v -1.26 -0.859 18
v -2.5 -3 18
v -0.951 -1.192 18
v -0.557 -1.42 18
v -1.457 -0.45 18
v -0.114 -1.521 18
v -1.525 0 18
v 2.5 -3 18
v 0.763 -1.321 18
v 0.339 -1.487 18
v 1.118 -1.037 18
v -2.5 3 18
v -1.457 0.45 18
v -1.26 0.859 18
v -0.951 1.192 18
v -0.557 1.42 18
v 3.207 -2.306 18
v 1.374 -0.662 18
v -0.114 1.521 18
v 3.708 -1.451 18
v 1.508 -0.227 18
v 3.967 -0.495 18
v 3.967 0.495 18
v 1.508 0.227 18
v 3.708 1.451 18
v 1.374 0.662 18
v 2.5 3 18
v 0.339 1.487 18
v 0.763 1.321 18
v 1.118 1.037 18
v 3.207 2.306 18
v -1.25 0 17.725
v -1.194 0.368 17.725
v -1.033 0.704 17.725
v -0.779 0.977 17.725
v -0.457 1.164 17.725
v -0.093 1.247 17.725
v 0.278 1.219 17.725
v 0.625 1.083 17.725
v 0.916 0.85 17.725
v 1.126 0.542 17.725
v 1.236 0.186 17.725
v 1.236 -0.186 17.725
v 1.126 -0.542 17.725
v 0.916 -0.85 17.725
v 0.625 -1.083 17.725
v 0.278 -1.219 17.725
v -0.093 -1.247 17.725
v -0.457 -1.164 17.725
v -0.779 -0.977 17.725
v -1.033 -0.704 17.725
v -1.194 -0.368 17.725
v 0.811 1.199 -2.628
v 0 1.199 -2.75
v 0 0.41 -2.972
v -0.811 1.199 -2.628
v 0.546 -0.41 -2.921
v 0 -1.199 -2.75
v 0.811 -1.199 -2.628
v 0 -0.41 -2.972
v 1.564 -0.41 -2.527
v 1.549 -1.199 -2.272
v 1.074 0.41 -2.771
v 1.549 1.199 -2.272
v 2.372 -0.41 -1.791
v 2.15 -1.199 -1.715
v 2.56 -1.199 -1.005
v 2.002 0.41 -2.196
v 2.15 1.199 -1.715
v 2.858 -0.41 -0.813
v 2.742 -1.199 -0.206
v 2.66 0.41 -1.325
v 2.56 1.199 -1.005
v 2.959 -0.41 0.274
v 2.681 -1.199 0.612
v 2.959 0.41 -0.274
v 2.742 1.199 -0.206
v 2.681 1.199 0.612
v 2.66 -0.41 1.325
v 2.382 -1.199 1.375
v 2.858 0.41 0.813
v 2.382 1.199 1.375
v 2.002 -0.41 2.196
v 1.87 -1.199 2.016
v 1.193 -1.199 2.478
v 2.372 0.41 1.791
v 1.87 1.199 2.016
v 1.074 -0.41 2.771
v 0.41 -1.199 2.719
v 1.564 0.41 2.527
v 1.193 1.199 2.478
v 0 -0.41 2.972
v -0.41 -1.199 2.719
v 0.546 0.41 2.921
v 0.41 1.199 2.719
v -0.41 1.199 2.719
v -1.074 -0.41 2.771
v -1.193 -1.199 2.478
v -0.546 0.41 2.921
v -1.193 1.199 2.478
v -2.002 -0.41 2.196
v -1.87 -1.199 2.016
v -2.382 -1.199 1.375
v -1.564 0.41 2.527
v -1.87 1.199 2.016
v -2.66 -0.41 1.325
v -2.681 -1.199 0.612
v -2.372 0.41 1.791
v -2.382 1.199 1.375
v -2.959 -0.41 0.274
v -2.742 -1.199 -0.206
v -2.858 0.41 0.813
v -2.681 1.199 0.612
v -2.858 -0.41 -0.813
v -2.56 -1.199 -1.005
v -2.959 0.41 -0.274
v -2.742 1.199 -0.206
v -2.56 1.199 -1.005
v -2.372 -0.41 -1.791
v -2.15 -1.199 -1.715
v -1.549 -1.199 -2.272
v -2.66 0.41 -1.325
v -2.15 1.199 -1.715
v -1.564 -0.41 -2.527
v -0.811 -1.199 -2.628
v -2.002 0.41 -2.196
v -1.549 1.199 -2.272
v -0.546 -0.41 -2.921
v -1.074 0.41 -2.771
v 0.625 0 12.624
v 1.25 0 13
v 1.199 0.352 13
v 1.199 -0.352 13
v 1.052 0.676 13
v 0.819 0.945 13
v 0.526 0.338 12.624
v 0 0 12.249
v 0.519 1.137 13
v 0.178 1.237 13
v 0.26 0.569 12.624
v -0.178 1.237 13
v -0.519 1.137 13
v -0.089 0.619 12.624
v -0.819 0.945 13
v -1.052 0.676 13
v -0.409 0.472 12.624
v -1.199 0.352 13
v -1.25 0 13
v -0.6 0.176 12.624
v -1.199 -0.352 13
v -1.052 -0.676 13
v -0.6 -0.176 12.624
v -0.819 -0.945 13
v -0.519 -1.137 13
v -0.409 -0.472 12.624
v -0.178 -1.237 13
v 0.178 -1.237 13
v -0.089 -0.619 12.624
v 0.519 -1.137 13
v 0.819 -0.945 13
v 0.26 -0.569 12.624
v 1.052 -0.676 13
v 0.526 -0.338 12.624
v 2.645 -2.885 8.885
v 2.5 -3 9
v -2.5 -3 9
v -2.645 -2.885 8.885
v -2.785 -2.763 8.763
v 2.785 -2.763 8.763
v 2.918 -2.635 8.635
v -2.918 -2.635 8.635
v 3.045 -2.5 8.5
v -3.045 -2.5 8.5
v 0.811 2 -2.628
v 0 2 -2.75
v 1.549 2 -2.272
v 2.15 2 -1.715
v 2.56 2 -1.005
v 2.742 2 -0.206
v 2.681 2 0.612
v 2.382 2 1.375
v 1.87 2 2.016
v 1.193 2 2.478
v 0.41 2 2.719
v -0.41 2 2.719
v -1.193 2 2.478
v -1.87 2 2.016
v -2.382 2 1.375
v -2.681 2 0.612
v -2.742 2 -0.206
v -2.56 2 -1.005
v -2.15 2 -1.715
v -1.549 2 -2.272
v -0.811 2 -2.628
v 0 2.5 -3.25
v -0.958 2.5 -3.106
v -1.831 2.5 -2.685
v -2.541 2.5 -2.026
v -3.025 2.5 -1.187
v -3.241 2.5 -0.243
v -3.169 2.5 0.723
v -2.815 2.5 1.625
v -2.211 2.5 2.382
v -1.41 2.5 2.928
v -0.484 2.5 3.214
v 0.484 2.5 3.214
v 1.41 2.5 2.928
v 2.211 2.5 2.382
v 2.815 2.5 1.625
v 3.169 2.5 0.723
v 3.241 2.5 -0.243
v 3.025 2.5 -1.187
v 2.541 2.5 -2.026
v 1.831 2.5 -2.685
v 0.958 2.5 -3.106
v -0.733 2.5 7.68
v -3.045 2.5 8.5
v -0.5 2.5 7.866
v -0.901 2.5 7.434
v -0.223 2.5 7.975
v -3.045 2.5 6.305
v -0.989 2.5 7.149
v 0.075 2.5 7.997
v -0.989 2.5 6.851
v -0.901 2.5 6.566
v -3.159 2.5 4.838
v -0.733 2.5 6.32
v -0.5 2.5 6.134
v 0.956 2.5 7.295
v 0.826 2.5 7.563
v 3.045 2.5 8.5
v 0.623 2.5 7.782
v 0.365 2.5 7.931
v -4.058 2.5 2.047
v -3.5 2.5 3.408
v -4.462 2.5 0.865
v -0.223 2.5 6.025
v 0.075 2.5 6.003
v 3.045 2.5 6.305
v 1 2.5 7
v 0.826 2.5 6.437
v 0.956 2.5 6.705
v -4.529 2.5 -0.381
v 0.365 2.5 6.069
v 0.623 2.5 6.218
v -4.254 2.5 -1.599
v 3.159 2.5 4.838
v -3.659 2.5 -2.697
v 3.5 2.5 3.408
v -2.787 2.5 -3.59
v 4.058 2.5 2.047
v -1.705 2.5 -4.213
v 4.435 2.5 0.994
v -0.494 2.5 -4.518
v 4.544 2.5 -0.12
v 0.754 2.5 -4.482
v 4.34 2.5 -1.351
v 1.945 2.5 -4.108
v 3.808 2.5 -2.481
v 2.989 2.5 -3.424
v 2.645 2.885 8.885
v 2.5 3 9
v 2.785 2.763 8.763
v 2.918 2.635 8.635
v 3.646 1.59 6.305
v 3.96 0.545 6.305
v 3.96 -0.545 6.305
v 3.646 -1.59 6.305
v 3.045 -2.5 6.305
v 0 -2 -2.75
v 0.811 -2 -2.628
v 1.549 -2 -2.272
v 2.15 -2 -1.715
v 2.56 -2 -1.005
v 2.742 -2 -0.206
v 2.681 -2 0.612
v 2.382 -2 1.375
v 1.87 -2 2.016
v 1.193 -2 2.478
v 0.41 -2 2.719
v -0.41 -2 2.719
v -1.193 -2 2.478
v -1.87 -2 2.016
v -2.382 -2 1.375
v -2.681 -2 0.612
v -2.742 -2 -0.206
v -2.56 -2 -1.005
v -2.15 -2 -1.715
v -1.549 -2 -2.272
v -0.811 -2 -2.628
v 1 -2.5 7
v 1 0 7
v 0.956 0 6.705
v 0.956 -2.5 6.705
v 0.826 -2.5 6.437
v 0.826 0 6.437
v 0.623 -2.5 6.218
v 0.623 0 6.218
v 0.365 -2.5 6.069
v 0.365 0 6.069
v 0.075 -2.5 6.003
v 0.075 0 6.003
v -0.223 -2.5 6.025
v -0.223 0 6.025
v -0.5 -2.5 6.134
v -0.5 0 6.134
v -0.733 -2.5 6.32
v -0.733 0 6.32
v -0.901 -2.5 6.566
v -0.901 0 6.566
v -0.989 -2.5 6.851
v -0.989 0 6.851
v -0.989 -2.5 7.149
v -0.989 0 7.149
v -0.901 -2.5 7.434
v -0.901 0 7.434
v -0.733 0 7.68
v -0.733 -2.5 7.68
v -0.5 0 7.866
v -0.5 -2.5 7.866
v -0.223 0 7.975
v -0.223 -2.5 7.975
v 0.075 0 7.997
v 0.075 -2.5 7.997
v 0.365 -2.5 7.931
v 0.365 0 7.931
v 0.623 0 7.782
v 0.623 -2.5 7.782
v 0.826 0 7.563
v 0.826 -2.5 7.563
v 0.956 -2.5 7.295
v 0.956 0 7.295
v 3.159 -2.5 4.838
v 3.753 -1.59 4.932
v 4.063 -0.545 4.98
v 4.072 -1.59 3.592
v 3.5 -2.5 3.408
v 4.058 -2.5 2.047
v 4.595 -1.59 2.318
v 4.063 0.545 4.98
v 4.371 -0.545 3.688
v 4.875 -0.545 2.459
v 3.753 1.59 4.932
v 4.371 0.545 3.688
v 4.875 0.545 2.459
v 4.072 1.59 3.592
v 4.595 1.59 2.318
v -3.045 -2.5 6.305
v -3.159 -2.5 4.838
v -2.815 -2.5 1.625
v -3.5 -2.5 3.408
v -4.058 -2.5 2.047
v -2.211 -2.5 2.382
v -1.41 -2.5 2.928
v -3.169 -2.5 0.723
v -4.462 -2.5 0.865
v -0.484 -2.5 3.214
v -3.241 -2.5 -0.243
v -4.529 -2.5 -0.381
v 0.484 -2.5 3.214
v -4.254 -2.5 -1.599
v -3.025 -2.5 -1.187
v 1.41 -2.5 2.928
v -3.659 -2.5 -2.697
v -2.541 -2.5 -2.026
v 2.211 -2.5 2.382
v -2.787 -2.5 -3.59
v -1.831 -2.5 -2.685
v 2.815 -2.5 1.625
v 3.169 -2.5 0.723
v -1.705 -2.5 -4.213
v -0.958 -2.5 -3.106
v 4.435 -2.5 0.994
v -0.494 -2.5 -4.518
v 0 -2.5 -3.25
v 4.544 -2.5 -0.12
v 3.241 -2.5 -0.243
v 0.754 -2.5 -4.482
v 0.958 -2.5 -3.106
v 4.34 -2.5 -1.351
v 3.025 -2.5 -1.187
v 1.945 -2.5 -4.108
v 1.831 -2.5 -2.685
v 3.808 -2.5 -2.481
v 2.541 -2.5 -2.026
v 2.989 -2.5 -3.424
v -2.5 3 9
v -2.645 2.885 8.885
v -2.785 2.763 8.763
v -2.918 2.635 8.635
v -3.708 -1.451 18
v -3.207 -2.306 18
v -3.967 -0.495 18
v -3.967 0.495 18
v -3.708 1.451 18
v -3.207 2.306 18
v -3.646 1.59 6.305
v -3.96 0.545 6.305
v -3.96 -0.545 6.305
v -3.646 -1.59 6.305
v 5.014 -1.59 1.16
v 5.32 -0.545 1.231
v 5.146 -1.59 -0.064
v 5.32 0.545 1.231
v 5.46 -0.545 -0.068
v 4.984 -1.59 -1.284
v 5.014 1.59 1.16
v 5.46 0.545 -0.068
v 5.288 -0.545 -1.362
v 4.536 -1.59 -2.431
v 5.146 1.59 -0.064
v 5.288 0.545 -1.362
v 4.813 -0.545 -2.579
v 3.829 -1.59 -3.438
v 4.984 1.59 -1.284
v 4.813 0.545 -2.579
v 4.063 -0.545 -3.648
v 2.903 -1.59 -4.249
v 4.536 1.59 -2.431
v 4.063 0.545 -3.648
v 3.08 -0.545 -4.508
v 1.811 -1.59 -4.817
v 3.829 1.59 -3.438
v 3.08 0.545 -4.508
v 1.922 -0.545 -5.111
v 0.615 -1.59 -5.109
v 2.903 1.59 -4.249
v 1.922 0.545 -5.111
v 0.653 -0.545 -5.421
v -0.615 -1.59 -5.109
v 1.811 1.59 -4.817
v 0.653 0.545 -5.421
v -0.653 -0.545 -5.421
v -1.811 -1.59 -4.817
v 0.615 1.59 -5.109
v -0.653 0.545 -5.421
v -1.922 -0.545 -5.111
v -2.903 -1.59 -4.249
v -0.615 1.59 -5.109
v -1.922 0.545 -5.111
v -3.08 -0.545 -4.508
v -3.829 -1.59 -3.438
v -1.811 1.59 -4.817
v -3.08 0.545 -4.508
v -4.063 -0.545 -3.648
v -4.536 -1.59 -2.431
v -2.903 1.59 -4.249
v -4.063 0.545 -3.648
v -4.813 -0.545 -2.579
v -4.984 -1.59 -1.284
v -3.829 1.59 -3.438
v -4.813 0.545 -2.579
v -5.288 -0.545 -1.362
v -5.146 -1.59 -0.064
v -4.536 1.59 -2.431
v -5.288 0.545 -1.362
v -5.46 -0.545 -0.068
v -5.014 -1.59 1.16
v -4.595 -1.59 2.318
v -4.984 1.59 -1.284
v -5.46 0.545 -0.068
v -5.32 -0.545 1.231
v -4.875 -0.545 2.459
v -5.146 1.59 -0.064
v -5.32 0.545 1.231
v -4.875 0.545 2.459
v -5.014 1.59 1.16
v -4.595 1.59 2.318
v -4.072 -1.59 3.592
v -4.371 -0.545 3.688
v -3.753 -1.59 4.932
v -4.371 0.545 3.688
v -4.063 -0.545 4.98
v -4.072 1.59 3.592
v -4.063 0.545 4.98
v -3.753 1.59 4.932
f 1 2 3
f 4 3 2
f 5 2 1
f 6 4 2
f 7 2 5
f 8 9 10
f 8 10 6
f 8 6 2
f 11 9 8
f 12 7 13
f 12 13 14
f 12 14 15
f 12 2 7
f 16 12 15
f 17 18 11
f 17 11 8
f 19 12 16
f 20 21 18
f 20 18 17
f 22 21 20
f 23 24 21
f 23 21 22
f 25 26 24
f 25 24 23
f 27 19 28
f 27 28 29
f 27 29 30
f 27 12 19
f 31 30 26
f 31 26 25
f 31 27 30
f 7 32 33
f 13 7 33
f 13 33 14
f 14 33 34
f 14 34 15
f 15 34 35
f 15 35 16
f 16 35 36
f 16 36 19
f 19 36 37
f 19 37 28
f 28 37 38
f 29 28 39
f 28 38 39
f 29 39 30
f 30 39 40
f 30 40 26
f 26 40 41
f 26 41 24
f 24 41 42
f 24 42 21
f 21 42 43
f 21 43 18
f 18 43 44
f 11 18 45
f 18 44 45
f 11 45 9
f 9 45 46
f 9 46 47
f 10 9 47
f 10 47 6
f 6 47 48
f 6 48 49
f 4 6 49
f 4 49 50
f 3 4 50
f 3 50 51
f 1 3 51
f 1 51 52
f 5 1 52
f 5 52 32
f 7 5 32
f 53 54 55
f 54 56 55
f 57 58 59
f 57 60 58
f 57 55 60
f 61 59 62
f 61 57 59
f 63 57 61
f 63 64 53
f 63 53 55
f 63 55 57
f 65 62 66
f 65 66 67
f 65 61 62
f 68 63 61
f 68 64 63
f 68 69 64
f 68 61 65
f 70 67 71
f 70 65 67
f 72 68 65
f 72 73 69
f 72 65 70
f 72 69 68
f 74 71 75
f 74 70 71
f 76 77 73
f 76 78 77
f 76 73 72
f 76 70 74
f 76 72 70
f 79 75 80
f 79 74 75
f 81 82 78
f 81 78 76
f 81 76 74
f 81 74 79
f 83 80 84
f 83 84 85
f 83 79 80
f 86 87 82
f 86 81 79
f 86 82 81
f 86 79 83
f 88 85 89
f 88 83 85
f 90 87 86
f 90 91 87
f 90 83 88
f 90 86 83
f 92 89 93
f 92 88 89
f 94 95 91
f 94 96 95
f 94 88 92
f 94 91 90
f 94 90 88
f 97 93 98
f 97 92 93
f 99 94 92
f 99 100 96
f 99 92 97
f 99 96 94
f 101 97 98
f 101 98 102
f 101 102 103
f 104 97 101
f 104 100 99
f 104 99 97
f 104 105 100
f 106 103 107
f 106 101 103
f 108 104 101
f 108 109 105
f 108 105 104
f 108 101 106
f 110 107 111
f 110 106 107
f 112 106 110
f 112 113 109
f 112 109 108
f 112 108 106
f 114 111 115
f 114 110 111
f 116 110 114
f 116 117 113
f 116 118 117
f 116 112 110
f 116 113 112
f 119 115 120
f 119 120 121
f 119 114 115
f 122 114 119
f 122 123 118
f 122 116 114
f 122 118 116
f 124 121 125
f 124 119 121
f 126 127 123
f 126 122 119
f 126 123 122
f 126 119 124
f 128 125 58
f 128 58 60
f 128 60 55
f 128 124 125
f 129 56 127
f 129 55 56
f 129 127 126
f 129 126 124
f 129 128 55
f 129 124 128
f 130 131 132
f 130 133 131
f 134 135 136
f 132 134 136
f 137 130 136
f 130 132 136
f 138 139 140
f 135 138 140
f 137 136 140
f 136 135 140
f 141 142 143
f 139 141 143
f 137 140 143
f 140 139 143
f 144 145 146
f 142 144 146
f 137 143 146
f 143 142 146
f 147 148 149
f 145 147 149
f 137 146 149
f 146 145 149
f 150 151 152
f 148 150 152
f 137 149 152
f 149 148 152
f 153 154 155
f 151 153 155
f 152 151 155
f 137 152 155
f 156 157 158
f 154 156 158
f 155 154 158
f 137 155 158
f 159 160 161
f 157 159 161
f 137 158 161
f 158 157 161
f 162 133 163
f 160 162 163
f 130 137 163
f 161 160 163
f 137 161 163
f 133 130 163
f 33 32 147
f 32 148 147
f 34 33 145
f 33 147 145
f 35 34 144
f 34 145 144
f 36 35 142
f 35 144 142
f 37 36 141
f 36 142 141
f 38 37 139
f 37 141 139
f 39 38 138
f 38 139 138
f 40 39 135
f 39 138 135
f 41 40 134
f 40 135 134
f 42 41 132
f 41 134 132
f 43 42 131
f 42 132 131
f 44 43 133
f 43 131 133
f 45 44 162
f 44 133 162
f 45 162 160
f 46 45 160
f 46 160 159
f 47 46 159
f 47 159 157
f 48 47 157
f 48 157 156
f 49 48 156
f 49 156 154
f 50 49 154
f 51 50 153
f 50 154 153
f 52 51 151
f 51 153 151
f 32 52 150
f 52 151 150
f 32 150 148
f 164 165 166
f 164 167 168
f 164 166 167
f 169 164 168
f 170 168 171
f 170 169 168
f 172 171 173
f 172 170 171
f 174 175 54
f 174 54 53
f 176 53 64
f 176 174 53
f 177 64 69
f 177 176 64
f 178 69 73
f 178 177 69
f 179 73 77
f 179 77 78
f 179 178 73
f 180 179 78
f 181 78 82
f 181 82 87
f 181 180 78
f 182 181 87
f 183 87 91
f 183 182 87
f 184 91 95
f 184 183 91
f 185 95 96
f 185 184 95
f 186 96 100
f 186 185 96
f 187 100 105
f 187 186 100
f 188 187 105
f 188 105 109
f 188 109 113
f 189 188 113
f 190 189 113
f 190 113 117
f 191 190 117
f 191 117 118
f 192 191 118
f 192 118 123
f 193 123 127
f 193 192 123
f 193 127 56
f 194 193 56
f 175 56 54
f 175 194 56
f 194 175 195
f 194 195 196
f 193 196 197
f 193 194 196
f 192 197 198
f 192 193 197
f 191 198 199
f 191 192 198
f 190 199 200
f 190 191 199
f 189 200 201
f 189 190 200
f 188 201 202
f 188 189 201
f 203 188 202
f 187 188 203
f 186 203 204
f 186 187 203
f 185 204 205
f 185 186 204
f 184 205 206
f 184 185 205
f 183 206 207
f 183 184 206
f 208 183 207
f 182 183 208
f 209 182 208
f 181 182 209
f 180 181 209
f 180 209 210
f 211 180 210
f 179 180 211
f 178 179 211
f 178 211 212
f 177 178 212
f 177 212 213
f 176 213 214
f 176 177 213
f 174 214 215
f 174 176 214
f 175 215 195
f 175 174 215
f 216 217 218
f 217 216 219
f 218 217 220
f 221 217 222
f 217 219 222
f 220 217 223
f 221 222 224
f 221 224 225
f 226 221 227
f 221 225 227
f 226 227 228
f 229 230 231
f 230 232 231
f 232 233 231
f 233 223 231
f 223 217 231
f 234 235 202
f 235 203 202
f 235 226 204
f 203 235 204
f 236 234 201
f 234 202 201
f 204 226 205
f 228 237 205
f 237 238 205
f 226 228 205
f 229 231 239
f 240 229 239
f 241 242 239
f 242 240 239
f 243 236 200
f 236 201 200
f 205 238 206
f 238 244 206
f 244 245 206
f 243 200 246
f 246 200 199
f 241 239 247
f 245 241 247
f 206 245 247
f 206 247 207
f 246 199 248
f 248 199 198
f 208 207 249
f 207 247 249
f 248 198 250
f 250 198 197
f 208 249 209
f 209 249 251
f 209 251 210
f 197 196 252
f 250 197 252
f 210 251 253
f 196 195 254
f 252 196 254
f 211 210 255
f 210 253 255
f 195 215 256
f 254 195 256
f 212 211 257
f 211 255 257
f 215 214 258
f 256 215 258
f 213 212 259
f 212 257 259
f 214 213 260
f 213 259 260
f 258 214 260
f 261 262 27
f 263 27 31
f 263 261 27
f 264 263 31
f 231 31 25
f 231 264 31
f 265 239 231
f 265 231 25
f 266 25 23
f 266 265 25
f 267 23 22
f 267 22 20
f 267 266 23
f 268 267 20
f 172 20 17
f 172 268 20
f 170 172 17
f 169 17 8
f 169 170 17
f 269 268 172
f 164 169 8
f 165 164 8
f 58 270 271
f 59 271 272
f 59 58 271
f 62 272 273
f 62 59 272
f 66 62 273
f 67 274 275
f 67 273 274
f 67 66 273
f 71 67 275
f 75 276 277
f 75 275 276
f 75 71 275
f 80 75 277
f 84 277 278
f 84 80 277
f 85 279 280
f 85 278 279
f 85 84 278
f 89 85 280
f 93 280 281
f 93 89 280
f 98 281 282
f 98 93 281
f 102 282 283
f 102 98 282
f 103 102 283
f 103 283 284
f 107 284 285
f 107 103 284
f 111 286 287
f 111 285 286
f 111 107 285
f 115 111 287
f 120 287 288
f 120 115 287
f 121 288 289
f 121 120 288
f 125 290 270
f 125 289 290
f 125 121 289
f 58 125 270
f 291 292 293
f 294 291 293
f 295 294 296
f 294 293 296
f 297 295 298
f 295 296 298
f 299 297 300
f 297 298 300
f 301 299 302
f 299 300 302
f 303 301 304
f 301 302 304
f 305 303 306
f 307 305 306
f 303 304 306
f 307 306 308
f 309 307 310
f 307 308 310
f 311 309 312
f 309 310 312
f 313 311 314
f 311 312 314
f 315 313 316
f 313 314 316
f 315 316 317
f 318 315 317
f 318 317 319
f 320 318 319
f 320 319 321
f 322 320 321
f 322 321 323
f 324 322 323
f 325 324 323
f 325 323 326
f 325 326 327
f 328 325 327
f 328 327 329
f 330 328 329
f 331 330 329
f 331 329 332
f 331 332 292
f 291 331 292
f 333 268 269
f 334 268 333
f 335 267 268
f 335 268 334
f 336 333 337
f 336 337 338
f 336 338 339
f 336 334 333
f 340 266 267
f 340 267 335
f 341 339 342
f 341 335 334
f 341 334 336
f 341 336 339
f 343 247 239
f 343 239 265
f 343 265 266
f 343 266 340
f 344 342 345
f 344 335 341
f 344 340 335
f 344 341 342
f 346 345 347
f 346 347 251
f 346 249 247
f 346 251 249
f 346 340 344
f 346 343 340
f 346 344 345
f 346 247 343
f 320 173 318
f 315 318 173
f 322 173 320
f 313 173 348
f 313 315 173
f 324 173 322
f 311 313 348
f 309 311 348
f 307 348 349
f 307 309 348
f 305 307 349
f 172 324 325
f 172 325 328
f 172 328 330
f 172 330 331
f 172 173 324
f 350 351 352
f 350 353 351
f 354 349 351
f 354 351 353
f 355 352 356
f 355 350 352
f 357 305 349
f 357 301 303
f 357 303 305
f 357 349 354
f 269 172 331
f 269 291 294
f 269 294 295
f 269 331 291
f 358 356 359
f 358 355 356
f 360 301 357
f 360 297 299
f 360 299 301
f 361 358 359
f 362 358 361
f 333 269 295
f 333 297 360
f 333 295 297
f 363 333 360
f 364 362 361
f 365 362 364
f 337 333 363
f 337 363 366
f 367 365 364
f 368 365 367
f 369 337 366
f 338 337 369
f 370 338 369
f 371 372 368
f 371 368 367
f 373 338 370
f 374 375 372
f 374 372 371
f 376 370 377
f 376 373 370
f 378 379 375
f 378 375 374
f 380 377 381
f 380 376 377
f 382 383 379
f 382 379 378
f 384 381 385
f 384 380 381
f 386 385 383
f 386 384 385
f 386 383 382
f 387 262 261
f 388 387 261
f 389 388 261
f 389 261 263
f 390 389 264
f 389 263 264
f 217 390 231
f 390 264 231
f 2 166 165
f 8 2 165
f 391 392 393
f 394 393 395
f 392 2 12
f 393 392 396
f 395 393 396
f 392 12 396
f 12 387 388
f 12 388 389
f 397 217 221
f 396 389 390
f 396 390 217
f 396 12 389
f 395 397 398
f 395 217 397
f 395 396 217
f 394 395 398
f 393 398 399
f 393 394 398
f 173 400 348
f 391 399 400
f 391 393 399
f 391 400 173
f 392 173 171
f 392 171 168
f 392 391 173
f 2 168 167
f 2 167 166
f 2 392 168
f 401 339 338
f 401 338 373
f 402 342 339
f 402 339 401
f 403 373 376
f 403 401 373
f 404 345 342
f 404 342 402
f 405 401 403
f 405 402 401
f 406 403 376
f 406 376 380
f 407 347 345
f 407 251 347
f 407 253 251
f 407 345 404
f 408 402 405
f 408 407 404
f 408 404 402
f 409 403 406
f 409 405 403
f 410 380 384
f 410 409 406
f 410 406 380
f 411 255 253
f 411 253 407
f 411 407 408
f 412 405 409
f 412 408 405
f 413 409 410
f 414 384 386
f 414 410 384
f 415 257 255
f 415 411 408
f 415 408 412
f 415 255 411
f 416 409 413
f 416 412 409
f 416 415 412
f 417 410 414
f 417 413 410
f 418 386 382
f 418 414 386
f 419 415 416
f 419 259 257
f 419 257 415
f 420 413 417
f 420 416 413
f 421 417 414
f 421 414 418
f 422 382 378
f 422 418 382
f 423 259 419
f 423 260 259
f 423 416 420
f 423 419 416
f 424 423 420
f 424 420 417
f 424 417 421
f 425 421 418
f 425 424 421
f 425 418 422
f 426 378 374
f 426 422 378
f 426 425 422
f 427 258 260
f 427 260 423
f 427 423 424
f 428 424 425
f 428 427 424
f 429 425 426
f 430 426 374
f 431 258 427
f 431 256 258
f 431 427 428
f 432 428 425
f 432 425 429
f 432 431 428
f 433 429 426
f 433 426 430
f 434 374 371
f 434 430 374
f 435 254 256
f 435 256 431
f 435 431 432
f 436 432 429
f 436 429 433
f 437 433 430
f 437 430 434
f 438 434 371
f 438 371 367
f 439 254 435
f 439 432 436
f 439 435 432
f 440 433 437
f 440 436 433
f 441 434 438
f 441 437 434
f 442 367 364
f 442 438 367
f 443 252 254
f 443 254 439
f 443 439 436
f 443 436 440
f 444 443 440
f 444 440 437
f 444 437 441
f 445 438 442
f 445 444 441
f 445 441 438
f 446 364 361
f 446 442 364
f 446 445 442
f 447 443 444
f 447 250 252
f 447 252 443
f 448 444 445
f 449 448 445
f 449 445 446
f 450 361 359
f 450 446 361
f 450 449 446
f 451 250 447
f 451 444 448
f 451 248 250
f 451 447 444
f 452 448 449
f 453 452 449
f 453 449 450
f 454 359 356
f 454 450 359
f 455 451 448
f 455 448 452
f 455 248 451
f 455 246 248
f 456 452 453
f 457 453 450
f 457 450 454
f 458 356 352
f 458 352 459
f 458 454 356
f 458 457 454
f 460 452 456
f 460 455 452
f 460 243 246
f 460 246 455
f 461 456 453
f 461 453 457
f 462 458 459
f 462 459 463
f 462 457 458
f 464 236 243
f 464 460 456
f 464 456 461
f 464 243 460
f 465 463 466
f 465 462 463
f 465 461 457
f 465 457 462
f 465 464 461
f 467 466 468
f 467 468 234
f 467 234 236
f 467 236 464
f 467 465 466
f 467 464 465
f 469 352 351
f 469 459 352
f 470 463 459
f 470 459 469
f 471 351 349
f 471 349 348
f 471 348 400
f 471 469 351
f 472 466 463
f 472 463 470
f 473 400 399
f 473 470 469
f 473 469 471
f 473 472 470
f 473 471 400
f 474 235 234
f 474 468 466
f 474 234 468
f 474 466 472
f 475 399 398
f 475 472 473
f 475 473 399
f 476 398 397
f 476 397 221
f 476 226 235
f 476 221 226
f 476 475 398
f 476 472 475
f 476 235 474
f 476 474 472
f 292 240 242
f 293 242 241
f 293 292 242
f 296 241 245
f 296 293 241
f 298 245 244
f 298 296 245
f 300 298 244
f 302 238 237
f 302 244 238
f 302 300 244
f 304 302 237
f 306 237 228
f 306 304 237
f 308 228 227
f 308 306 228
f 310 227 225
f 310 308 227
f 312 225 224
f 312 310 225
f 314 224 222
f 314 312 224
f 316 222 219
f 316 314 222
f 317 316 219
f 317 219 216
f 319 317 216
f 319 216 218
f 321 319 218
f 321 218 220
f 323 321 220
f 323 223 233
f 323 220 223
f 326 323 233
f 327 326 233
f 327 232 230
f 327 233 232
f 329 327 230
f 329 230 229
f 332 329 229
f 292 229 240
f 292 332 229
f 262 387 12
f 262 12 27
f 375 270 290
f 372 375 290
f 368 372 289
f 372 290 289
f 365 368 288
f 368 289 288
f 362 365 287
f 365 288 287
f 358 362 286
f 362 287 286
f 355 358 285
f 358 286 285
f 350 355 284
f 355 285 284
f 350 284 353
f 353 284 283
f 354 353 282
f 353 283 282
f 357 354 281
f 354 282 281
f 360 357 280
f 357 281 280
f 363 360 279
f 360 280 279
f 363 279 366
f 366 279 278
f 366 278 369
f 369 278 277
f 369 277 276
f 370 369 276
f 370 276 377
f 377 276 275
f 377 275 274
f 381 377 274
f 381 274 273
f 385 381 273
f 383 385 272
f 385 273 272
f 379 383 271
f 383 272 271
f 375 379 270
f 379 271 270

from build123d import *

# Parameters (mm, degrees)
BOSS_EXTRUDE1_DEPTH         = 3
FILLET1_R                   = 10
M3_TAPPED_HOLE1_D           = 2.5
M3_TAPPED_HOLE1_DEPTH       = 5
M3_TAPPED_HOLE1_CSINK_D     = 3.05
M3_TAPPED_HOLE1_CSINK_ANGLE = 90
M3_TAPPED_HOLE1_TIP         = 0.751075774
CUT_EXTRUDE1_DEPTH          = 6.5000001
SKETCH8_R                   = 1
CUT_EXTRUDE2_DEPTH          = 4
CUT_EXTRUDE2_DEPTH_BACK     = 4
CHAMFER1_SIZE               = 0.5


with BuildPart() as part:
    # Sketch1 → Boss-Extrude1 (new body, symmetric)
    with BuildSketch(Plane(origin=(0, 0, 0), x_dir=(1, 0, 0), z_dir=(0, 1, 0))):
        with BuildLine():
            Line((-2.5, -3.122498999), (-2.5, -18))
            Line((-2.5, -18), (2.5, -18))
            Line((2.5, -18), (2.5, -3.122498999))
            ThreePointArc((2.5, -3.122498999), (0, 4), (-2.5, -3.122498999))
        make_face()
    extrude(amount=BOSS_EXTRUDE1_DEPTH, both=True)

    # Fillet1
    fillet1_edges = [part.edges().sort_by_distance(p)[0] for p in [
        (-2.5, 0, 3.122498999),
        (2.5, 0, 3.122498999),
    ]]
    fillet(fillet1_edges, radius=FILLET1_R)

    # Sweep1: sweep along a path in Sketch3
    with BuildLine(Plane(origin=(0, 3, 0), x_dir=(1, 0, 0), z_dir=(0, 1, 0))) as sweep1_path:
        Line((2.5, -18), (2.5, -6.304760106))
        ThreePointArc((2.5, -6.304760106), (2.771543949, -3.990209857), (3.571428571, -1.80136003))
        ThreePointArc((3.571428571, -1.80136003), (0, 4), (-3.571428571, -1.80136003))
        ThreePointArc((-3.571428571, -1.80136003), (-2.771543949, -3.990209857), (-2.5, -6.304760106))
        Line((-2.5, -6.304760106), (-2.5, -18))
    # Sketch2 → Sweep1 (sweep)
    with BuildSketch(Plane.XY.offset(18)):
        with BuildLine():
            Line((2.5, 3), (2.5, -3))
            ThreePointArc((2.5, -3), (4, 0), (2.5, 3))
        make_face()
    sweep(path=sweep1_path.line)

    # M3 Tapped Hole1
    with Locations(Plane.XY.offset(18)):
        with Locations((0, 0)):
            CounterSinkHole(M3_TAPPED_HOLE1_D / 2, M3_TAPPED_HOLE1_CSINK_D / 2, depth=M3_TAPPED_HOLE1_DEPTH, counter_sink_angle=M3_TAPPED_HOLE1_CSINK_ANGLE)
            with Locations((0, 0, -(M3_TAPPED_HOLE1_DEPTH + M3_TAPPED_HOLE1_TIP / 2))):  # 118° drill point
                Cone(0, M3_TAPPED_HOLE1_D / 2, M3_TAPPED_HOLE1_TIP, mode=Mode.SUBTRACT)

    # Sketch6 → Cut-Extrude1 (cut, symmetric)
    with BuildSketch(Plane(origin=(0, 0, 0), x_dir=(0, 0, -1), z_dir=(1, 0, 0))):
        Polygon((-9, 3), (-8.5, 2.5), (11, 2.5), (11, 3), align=None)
    cut_extrude1 = extrude(amount=CUT_EXTRUDE1_DEPTH, both=True, mode=Mode.SUBTRACT)

    # Mirror1: Cut-Extrude1 across plane
    add(cut_extrude1.mirror(Plane.ZX), mode=Mode.SUBTRACT)

    # Sketch7 → Cut-Revolve1 (revolve, cut)
    with BuildSketch(Plane(origin=(0, 0, 0), x_dir=(0, 0, -1), z_dir=(1, 0, 0))):
        with BuildLine():
            Line((0, 3), (0, -3))
            Line((0, -3), (2.75, -3))
            Line((2.75, -3), (2.75, -1.198957881))
            ThreePointArc((2.75, -1.198957881), (3, 0), (2.75, 1.198957881))
            Line((2.75, 1.198957881), (2.75, 3))
            Line((2.75, 3), (0, 3))
        make_face()
    revolve(axis=Axis((0, 6.277574948, 0), (0, -1, 0)), mode=Mode.SUBTRACT)

    # Sketch8 → Cut-Extrude2 (cut, two sides)
    with BuildSketch(Plane(origin=(0, 0, 0), x_dir=(1, 0, 0), z_dir=(0, 1, 0))) as cut_extrude2_sk:
        with Locations((0, -7)):
            Circle(SKETCH8_R)
    extrude(amount=CUT_EXTRUDE2_DEPTH, mode=Mode.SUBTRACT)
    extrude(cut_extrude2_sk.sketch, amount=-CUT_EXTRUDE2_DEPTH_BACK, mode=Mode.SUBTRACT)

    # Chamfer1
    chamfer1_edges = [part.edges().sort_by_distance(p)[0] for p in [
        (0, 2.5, 2.75),
        (0, -2.5, 2.75),
    ]]
    chamfer(chamfer1_edges, length=CHAMFER1_SIZE)


solid = part.part
